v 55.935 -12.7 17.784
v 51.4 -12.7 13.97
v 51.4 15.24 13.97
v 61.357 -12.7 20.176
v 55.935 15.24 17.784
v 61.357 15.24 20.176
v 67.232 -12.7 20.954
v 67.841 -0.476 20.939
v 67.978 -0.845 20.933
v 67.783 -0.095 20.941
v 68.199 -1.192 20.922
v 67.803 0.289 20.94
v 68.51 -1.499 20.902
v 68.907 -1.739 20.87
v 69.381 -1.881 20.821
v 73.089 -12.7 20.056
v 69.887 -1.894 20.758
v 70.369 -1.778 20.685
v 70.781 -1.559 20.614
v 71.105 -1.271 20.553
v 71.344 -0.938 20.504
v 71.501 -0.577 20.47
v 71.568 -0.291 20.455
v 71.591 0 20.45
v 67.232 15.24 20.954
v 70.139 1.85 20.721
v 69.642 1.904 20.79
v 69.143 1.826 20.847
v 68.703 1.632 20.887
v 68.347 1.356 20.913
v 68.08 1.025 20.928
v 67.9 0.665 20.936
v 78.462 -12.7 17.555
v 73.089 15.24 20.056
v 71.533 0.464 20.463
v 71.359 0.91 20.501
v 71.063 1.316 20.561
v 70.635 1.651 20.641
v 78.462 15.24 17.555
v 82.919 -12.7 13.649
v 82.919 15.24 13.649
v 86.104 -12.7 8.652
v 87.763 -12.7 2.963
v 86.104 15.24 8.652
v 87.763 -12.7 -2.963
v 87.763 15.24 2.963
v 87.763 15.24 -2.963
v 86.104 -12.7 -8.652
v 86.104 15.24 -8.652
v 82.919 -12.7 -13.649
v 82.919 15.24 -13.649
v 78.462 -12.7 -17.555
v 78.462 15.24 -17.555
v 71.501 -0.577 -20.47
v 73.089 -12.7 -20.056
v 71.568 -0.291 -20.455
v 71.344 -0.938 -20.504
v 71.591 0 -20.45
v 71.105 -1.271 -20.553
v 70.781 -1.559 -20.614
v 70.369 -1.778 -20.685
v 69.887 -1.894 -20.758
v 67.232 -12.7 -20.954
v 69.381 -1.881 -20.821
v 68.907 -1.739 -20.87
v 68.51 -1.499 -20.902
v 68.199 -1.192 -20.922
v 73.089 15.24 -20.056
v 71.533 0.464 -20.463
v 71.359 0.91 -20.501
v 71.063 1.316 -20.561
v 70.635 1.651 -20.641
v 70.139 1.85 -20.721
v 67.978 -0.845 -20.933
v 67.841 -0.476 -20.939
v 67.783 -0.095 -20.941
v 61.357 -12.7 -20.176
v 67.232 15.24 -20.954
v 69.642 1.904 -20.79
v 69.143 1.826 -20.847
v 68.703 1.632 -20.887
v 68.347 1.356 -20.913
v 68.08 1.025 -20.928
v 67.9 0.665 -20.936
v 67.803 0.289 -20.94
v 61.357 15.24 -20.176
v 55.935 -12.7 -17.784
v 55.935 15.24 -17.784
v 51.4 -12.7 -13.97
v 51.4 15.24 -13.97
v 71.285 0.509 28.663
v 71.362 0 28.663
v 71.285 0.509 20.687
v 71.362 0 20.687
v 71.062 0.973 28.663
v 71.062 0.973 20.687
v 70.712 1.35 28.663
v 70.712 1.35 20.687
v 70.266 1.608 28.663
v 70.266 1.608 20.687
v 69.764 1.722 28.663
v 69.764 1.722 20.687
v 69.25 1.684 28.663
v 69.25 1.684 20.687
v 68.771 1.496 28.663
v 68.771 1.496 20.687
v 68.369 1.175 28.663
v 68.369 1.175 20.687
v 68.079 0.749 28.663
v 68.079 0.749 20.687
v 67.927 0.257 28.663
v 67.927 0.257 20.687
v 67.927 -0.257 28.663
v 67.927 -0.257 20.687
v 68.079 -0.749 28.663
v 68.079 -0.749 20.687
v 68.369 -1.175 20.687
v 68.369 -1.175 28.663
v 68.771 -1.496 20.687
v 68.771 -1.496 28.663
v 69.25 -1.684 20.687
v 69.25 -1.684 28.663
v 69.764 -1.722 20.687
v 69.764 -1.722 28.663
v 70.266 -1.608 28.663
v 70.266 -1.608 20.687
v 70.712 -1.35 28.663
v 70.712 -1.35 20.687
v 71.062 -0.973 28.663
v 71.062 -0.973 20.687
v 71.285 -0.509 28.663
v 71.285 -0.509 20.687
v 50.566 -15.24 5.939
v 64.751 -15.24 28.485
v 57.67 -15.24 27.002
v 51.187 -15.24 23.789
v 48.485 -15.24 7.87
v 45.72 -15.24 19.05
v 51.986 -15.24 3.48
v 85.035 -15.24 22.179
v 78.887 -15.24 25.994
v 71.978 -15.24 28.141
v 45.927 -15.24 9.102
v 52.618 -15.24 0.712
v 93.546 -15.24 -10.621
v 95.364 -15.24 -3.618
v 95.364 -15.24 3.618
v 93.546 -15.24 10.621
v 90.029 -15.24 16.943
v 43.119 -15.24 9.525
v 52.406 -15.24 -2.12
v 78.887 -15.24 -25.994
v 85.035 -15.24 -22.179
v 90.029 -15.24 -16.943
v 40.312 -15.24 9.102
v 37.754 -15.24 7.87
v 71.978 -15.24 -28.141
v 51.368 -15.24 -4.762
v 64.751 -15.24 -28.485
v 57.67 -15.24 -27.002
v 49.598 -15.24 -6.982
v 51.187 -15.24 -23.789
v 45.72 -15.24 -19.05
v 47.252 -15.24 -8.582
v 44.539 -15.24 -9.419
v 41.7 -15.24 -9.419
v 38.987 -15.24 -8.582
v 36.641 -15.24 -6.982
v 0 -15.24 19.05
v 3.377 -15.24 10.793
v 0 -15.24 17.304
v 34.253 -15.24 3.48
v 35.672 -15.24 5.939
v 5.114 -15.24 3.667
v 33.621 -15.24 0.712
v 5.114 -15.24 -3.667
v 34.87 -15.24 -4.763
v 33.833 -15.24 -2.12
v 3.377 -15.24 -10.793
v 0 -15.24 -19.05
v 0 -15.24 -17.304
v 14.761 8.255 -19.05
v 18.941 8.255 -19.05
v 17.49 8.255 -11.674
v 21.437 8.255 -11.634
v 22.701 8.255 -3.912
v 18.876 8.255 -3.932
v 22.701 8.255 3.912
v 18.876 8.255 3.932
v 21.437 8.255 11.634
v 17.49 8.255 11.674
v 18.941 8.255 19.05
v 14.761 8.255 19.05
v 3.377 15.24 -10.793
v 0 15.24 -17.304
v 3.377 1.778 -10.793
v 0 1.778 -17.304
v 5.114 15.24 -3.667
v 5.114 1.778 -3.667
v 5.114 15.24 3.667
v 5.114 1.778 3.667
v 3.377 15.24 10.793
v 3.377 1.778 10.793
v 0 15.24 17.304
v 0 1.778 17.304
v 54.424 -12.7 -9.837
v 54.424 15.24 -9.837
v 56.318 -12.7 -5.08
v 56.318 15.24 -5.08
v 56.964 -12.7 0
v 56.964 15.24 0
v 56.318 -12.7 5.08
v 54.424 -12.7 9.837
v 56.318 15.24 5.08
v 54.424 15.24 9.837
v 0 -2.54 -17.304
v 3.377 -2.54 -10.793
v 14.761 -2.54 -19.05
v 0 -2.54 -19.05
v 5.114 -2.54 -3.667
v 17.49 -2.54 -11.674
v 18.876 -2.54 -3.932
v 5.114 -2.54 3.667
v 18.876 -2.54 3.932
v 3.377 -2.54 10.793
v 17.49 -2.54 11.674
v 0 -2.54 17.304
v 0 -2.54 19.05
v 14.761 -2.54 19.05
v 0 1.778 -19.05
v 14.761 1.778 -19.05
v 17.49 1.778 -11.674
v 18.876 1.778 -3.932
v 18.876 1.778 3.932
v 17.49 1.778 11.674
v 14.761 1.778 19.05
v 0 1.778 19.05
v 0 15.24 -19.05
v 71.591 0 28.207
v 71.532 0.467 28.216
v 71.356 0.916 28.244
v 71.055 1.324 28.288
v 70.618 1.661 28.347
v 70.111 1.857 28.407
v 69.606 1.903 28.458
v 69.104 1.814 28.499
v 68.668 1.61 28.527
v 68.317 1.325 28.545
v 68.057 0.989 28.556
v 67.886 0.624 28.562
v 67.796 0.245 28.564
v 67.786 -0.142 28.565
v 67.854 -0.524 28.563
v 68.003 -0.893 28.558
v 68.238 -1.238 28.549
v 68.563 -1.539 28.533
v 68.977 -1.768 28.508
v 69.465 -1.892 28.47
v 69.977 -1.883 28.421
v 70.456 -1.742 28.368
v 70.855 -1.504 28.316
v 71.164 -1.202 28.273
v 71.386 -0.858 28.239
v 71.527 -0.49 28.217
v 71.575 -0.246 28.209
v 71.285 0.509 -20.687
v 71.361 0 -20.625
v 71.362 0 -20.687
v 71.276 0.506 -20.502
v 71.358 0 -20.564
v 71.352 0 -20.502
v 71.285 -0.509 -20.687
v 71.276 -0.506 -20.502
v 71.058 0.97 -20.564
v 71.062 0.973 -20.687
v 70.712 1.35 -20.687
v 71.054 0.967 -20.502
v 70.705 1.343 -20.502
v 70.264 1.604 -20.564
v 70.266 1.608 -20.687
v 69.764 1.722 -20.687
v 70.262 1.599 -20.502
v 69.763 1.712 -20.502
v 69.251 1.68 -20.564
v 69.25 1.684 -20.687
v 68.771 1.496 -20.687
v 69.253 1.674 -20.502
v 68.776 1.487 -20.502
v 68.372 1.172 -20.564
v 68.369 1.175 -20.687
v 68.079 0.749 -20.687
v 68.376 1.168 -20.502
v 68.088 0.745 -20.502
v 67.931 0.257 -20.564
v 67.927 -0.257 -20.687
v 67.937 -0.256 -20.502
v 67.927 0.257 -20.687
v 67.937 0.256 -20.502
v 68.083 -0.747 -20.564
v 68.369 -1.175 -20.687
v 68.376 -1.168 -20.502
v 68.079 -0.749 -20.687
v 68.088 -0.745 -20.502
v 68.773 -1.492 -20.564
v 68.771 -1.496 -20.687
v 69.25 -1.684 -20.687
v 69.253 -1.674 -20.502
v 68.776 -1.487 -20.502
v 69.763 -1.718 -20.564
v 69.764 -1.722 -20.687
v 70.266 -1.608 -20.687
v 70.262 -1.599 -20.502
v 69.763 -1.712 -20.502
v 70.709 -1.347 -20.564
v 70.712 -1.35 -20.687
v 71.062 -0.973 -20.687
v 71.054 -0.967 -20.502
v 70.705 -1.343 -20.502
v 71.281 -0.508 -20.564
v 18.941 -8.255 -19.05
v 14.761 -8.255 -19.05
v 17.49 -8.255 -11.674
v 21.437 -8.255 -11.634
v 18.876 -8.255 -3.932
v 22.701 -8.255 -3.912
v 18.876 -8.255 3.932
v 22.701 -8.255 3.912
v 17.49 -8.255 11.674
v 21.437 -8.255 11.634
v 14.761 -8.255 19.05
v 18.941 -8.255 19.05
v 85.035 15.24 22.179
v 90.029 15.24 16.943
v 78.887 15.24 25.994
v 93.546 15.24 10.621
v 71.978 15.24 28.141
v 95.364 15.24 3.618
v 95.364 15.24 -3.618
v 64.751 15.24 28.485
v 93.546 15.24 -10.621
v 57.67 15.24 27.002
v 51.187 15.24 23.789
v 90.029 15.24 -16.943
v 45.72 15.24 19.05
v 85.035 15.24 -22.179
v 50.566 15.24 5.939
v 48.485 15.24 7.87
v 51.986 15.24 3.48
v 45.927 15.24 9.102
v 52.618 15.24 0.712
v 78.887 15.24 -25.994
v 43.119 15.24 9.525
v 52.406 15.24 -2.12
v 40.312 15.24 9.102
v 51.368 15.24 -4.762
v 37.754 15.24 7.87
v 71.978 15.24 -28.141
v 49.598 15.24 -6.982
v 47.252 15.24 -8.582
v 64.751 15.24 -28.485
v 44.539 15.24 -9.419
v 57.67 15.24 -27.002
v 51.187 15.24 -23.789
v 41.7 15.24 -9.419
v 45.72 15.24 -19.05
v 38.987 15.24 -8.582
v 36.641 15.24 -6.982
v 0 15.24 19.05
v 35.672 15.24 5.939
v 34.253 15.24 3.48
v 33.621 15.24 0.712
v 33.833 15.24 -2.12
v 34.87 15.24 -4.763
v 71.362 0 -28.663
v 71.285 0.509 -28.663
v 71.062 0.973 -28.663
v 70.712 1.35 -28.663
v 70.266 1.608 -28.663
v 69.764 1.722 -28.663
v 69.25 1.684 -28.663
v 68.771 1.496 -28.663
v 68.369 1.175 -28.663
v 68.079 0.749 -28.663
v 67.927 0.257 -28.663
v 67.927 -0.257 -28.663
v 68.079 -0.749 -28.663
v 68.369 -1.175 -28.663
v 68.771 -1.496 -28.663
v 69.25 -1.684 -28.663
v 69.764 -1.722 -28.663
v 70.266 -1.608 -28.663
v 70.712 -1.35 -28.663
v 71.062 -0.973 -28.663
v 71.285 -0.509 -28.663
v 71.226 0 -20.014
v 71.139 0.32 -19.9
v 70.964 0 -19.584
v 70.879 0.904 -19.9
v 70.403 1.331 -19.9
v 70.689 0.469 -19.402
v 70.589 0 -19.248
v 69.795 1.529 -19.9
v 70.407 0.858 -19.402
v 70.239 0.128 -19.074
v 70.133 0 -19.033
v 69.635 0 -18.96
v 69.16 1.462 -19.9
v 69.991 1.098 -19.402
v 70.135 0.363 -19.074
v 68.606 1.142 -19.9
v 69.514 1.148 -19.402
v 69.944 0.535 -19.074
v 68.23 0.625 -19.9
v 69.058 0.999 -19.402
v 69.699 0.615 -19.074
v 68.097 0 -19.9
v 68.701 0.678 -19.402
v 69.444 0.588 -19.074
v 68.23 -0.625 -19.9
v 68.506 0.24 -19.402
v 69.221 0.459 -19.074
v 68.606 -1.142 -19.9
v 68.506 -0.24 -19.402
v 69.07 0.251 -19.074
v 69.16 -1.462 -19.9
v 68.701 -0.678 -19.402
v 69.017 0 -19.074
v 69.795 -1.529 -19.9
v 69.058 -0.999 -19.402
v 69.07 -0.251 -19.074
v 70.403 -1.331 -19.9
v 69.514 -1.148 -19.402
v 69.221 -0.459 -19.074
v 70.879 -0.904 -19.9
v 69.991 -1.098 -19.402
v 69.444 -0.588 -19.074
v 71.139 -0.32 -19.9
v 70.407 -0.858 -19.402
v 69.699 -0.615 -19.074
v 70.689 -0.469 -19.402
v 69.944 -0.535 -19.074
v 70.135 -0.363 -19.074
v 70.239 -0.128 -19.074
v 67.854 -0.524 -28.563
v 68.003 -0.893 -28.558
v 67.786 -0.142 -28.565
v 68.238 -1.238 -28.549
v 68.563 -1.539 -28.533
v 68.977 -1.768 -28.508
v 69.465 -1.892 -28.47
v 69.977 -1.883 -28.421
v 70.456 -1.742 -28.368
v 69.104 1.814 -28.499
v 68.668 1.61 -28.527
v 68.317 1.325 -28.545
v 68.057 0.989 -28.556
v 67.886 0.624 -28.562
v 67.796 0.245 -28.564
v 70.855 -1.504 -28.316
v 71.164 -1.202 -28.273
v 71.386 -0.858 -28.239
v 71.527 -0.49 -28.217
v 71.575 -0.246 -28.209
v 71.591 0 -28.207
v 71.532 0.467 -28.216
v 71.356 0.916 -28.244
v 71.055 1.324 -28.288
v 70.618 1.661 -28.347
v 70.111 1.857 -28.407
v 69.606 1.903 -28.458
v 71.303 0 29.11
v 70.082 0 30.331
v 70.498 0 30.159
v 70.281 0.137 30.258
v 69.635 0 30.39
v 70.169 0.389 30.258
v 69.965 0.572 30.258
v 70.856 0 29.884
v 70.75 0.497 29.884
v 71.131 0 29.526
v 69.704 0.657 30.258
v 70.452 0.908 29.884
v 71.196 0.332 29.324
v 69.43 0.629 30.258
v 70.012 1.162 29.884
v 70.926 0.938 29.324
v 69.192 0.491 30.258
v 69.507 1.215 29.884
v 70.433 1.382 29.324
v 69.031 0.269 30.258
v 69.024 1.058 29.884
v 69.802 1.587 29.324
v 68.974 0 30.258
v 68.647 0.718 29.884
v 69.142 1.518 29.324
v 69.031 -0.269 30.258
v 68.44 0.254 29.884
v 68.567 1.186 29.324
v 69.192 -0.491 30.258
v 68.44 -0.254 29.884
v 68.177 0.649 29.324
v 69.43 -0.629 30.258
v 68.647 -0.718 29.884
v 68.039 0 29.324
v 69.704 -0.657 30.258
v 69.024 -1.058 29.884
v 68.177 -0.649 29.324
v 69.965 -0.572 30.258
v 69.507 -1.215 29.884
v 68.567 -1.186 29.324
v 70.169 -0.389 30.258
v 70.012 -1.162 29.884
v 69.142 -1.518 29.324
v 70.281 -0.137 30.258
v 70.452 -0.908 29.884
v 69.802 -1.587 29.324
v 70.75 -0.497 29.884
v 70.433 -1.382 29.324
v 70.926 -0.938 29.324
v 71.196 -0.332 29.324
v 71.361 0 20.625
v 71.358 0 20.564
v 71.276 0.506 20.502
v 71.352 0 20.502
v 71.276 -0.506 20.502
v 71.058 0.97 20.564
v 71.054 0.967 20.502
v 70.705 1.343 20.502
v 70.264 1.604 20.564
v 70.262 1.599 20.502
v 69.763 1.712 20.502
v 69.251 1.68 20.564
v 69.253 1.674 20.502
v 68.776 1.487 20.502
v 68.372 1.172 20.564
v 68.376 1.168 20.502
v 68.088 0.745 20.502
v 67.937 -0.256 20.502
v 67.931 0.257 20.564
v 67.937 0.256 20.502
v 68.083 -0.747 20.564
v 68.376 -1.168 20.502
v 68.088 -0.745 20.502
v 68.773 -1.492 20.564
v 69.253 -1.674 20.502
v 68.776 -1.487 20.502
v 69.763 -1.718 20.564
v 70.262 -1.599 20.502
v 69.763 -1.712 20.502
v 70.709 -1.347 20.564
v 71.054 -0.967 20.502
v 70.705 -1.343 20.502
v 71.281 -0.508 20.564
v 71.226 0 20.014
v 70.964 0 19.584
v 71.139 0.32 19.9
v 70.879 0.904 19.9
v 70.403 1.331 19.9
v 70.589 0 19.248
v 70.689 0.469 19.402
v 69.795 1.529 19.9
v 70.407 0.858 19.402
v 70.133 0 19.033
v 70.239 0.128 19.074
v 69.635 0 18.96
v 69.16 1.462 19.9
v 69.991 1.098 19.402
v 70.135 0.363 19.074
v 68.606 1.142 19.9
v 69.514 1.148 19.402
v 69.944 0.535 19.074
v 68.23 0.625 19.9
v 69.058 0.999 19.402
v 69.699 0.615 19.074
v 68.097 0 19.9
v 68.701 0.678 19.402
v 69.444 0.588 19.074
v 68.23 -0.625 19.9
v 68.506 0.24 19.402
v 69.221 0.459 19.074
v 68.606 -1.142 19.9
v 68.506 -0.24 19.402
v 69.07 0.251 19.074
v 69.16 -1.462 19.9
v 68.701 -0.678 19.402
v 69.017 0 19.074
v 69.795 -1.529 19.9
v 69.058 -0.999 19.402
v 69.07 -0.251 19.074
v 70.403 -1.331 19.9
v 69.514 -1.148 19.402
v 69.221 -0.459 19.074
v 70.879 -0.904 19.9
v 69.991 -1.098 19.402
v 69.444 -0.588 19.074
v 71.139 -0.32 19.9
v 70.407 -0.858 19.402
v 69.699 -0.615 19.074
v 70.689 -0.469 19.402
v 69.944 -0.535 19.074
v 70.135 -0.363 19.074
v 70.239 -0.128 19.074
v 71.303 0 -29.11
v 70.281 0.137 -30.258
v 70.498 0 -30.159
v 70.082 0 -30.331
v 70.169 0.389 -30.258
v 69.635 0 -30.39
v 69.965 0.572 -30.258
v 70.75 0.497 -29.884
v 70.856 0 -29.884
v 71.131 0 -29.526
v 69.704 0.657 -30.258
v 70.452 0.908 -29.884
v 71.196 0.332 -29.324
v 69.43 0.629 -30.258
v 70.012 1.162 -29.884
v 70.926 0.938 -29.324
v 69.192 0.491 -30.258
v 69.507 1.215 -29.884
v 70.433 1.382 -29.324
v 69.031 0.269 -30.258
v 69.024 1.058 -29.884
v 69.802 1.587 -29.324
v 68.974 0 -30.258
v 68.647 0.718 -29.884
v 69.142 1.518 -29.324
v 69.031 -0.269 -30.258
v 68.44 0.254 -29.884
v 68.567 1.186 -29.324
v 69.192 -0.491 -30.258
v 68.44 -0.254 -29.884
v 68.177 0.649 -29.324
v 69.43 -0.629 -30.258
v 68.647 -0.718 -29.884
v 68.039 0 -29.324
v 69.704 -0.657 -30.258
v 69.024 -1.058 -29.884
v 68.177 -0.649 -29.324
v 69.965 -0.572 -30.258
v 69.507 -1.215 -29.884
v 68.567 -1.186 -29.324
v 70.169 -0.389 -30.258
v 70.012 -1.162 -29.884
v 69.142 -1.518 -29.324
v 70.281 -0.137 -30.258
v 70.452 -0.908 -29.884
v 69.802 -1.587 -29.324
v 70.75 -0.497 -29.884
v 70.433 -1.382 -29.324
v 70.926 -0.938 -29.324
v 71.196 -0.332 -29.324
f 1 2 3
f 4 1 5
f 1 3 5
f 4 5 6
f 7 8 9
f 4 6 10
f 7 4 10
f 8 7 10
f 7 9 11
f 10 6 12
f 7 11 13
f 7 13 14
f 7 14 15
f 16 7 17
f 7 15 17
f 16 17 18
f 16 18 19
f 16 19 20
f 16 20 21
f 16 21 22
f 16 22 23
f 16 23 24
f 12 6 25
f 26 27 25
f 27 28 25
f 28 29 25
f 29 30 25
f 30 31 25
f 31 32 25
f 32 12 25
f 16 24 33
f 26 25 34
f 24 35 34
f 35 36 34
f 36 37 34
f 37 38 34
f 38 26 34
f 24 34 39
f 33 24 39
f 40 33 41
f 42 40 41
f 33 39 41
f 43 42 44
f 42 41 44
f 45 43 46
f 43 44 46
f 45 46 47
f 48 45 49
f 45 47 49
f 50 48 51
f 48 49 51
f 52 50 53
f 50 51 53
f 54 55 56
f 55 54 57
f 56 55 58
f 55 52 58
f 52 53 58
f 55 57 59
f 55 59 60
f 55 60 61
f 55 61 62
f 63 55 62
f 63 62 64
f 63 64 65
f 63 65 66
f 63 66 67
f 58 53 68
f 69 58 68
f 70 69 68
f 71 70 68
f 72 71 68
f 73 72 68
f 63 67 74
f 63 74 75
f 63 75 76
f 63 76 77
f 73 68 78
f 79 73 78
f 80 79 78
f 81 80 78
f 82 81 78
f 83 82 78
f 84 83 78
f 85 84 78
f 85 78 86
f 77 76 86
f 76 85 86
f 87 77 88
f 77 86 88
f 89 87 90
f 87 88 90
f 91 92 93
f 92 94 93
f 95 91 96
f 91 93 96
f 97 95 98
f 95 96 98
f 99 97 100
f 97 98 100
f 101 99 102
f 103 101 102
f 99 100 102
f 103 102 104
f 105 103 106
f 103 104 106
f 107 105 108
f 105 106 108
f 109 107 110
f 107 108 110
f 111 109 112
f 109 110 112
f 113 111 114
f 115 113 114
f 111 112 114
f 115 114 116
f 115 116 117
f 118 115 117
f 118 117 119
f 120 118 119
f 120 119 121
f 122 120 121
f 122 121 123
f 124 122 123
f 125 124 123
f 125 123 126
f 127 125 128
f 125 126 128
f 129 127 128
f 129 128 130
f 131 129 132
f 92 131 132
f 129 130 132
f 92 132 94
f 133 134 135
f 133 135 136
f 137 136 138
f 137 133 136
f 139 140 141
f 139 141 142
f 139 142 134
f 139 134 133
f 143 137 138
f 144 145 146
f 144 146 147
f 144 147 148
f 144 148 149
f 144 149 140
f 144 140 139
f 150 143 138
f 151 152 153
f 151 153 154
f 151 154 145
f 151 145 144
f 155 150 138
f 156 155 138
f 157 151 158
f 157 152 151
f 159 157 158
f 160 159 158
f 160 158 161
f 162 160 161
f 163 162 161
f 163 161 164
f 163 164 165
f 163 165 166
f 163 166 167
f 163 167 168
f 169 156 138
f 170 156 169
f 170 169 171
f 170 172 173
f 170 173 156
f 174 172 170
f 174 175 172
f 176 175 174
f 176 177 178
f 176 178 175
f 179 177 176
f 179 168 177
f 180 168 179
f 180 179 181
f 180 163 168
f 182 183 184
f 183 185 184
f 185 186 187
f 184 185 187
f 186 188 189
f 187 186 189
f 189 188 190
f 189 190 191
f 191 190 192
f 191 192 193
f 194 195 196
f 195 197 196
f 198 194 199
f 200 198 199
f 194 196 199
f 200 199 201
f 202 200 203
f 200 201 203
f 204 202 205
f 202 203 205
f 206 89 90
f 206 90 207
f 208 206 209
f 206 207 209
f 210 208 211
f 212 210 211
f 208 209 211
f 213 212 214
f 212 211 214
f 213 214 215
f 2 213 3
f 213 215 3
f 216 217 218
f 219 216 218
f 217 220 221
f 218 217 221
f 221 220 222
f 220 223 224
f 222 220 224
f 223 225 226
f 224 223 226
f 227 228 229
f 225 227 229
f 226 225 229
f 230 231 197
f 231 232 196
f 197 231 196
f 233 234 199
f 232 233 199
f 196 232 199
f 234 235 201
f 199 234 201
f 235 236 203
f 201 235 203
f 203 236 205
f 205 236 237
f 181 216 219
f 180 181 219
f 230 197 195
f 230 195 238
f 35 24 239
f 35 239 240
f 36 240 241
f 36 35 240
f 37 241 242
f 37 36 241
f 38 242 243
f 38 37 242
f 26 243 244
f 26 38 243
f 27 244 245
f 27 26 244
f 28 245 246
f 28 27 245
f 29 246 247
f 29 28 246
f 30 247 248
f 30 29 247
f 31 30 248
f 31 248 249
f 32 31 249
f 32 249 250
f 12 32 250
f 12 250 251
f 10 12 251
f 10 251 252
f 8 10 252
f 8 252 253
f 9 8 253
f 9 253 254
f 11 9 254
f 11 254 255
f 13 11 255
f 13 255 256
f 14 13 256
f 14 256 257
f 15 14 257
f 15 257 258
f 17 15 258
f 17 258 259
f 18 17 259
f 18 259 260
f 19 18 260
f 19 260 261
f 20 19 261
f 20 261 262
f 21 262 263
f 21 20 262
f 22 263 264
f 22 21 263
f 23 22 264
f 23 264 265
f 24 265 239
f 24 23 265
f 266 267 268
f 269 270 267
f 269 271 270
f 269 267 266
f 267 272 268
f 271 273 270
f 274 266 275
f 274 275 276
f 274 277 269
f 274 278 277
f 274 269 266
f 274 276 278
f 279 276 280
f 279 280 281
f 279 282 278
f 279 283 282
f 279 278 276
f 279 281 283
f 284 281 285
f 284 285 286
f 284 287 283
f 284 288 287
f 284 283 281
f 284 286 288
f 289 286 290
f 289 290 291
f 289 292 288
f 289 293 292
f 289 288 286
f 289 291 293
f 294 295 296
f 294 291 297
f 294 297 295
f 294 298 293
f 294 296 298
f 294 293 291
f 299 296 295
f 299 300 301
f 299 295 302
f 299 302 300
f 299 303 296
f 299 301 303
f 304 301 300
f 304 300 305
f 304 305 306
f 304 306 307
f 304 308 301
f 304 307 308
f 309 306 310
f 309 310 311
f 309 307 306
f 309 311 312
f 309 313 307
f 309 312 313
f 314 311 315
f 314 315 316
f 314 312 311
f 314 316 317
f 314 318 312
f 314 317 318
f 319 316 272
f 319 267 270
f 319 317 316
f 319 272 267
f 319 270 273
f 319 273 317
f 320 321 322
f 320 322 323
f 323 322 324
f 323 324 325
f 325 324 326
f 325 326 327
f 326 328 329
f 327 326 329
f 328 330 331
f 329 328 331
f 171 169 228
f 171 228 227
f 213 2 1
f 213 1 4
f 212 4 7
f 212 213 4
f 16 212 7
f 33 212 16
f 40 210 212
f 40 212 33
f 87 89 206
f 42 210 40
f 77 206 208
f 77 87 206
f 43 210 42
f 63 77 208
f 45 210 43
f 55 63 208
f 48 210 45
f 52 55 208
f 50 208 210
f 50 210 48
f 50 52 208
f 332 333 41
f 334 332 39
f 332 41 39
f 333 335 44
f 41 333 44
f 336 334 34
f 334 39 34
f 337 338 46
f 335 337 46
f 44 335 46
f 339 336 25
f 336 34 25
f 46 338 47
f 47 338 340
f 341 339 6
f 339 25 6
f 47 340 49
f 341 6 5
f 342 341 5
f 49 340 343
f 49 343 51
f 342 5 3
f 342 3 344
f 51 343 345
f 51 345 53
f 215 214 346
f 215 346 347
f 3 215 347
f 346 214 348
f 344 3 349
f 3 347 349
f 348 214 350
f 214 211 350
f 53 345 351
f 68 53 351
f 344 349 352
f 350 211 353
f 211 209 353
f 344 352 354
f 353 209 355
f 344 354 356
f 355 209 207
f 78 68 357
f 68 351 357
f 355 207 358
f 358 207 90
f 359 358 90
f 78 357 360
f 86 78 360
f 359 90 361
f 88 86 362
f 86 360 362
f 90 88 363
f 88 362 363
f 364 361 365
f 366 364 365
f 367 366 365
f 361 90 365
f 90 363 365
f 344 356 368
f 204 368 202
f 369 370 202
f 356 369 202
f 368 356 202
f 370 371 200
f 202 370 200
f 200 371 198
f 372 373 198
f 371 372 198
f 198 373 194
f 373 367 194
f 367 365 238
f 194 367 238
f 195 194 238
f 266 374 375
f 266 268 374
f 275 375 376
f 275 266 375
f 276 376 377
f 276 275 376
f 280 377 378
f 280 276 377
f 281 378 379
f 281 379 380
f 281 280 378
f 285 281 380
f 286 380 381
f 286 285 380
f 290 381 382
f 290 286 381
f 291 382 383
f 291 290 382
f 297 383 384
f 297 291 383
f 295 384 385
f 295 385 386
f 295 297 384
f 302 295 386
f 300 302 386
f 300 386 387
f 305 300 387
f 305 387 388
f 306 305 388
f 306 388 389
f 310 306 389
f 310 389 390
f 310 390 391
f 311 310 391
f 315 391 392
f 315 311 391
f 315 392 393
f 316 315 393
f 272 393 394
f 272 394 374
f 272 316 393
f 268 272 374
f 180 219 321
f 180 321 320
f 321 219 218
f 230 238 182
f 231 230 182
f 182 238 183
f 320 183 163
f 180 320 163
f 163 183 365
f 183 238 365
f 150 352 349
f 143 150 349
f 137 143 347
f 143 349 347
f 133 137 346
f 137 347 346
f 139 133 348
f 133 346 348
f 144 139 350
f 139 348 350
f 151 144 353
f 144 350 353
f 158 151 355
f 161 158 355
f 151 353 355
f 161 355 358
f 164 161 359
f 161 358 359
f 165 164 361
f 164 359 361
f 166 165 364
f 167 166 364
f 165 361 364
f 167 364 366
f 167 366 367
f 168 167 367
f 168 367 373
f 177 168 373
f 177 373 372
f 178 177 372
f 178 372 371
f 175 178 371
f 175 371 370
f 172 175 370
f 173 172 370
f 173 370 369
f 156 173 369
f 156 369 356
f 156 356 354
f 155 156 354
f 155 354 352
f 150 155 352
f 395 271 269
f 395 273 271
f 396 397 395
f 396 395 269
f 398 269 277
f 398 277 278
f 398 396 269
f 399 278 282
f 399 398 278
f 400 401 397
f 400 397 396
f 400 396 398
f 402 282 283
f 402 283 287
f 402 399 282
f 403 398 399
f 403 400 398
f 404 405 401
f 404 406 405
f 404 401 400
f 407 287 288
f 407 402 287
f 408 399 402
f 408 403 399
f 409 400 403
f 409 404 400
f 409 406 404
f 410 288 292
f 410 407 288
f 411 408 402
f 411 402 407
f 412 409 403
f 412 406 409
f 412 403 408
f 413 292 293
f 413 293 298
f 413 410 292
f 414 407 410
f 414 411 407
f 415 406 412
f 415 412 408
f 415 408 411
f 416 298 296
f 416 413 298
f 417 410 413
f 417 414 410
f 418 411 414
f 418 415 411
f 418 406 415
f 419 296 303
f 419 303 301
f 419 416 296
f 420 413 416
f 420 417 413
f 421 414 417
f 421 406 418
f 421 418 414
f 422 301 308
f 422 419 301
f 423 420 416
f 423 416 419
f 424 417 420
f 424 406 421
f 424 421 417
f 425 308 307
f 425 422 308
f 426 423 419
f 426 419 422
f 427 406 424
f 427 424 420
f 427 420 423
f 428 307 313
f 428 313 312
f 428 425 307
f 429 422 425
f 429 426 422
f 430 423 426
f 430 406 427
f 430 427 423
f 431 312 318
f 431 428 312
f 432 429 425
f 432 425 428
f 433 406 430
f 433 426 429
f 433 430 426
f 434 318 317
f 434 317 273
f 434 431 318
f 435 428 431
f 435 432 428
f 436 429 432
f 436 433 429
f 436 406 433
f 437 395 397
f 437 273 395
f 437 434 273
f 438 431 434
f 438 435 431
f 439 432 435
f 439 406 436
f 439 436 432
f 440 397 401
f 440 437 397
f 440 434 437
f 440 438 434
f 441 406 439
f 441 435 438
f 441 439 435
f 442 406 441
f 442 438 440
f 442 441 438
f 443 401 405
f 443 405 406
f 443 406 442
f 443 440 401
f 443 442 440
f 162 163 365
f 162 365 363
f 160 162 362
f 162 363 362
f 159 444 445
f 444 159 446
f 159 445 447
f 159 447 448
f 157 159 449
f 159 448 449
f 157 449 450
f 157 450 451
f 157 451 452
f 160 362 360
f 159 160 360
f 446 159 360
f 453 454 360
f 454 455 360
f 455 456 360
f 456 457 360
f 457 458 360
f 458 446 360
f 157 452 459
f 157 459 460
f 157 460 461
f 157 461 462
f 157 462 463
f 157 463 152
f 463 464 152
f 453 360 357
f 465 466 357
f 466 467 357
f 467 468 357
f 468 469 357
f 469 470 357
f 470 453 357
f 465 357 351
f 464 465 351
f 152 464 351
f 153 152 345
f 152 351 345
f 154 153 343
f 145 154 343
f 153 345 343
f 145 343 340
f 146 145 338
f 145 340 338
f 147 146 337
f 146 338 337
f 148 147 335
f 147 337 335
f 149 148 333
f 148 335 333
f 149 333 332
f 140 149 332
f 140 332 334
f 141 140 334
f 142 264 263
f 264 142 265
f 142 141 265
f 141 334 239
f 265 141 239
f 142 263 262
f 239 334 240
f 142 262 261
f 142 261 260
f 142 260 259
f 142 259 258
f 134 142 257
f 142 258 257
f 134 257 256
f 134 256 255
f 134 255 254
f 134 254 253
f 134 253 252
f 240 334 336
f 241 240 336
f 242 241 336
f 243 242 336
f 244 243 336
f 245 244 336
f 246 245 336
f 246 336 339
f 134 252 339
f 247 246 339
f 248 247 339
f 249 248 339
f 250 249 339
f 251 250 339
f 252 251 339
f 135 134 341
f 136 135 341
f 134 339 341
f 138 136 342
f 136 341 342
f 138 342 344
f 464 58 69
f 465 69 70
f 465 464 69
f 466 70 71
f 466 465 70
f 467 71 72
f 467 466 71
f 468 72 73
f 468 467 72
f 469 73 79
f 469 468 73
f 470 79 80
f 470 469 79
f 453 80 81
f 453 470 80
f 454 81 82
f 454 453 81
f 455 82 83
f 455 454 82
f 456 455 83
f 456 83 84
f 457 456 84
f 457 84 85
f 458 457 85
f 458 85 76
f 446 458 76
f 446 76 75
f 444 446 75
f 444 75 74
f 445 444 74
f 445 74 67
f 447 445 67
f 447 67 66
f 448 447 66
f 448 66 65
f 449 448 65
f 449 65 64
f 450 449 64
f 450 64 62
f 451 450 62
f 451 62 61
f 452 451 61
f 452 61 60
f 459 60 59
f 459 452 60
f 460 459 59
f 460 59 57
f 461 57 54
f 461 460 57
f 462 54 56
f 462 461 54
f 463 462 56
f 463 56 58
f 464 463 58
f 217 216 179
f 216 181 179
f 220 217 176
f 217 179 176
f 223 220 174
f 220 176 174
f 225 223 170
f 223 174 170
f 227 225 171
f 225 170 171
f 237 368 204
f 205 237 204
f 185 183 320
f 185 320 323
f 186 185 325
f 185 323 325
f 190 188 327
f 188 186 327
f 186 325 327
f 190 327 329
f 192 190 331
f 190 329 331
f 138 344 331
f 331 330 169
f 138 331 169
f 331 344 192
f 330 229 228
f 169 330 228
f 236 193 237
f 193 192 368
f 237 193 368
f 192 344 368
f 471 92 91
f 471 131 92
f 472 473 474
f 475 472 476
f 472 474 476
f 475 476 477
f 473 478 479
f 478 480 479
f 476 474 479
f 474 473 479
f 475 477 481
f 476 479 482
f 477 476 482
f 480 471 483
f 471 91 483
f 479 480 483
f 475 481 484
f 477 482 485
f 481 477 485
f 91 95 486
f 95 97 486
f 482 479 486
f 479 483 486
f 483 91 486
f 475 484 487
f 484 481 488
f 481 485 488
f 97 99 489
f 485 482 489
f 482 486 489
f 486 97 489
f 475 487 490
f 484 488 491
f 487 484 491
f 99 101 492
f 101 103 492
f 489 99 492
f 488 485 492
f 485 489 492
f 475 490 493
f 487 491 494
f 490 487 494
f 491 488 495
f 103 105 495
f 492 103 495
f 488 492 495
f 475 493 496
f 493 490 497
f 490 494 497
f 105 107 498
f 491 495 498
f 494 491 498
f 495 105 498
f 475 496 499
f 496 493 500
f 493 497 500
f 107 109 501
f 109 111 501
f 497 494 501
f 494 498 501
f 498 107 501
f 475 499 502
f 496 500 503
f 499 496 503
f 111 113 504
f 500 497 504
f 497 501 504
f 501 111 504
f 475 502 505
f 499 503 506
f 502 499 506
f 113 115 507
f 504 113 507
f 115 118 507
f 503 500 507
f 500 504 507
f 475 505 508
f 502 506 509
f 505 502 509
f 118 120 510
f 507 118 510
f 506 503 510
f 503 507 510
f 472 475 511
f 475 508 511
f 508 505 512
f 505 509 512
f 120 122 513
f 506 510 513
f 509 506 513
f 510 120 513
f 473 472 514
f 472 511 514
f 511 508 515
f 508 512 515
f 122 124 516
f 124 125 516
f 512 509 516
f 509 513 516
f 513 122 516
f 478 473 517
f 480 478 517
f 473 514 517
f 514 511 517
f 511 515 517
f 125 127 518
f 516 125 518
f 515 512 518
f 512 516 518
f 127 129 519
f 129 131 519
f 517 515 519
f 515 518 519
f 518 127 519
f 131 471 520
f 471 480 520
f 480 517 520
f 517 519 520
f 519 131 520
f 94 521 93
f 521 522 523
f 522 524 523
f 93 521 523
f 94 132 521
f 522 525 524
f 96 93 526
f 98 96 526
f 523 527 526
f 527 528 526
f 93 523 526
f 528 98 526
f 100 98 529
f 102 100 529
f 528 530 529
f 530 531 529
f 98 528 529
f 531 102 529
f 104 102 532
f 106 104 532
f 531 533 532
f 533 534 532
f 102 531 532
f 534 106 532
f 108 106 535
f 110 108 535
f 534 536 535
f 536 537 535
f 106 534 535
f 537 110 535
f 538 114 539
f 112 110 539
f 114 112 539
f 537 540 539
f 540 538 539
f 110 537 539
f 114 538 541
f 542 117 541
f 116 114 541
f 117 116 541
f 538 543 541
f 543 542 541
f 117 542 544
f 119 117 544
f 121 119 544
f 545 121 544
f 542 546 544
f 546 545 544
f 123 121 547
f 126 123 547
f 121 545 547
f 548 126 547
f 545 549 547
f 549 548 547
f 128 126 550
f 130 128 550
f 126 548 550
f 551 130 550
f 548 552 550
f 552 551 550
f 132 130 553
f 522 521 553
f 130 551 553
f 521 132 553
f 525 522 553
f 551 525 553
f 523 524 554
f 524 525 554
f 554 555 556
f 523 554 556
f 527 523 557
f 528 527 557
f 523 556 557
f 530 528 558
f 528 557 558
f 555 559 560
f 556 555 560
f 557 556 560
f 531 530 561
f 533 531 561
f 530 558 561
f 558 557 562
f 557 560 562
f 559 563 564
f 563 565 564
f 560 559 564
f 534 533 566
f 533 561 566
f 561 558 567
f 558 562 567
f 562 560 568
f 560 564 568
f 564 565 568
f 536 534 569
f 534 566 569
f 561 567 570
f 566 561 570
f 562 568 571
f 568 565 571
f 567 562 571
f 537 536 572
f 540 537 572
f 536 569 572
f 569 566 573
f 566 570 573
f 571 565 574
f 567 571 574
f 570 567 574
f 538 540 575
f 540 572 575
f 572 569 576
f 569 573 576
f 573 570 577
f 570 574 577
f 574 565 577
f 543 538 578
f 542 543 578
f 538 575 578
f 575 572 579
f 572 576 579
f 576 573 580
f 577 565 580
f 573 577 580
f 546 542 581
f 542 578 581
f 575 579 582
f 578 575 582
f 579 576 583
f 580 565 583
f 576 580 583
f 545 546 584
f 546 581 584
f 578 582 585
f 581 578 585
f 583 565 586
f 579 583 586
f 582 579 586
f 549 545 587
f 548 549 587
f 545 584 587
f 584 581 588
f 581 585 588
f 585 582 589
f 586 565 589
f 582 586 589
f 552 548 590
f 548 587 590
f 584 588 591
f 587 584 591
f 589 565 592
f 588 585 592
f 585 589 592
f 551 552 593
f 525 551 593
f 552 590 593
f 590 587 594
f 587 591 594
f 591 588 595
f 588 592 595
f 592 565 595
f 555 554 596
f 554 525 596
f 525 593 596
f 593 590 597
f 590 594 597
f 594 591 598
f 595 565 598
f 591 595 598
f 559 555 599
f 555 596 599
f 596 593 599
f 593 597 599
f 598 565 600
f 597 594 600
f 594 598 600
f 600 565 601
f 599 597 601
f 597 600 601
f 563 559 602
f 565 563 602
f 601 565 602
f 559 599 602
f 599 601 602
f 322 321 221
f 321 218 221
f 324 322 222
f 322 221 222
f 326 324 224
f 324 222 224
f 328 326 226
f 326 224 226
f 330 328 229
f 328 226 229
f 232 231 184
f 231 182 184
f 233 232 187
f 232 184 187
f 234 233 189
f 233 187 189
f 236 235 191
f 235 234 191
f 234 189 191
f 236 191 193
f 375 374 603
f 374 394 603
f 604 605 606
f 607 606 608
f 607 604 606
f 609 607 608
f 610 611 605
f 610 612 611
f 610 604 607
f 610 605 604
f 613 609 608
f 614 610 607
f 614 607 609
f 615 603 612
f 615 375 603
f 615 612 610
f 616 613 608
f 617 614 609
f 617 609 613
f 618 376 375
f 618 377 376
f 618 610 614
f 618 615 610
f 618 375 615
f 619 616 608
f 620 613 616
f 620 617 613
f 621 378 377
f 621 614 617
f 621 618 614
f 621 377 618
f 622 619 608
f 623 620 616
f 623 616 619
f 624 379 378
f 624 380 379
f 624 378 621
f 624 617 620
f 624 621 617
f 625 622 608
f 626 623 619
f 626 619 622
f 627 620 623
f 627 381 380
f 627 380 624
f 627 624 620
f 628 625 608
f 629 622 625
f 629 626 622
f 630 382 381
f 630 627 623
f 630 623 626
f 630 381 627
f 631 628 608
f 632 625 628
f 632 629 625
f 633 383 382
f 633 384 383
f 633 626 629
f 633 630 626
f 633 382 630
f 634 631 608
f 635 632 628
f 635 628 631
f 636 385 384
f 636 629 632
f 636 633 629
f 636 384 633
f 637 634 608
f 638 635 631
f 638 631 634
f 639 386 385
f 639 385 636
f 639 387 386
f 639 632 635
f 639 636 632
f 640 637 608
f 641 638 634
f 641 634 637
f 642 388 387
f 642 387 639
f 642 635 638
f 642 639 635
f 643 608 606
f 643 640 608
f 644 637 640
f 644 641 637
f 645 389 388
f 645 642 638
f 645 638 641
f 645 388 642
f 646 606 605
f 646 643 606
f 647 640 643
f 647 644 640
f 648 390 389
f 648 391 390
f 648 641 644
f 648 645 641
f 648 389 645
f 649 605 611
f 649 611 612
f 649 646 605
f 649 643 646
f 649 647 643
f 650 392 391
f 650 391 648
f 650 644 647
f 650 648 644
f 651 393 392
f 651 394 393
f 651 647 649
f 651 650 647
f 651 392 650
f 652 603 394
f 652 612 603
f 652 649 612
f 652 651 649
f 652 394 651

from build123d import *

# Parameters (mm, degrees)
BOSS_EXTRUDE1_DEPTH     = 15.24
CUT_EXTRUDE1_DEPTH      = 27.94
CUT_EXTRUDE2_DEPTH      = 101.930245942
CUT_EXTRUDE2_DEPTH_BACK = 101.930245942
SKETCH4_R               = 1.905
SKETCH6_R               = 9.525
CUT_EXTRUDE3_DEPTH      = 105.836564482


with BuildPart() as part:
    # Sketch1 → Boss-Extrude1 (new, symmetric)
    with BuildSketch(Plane(origin=(0, 0, 0), x_dir=(1, 0, 0), z_dir=(0, 1, 0))):
        with BuildLine():
            Line((0, 19.05), (45.72, 19.05))
            ThreePointArc((45.72, 19.05), (95.593547486, 0), (45.72, -19.05))
            Line((45.72, -19.05), (0, -19.05))
            Line((0, -19.05), (0, 19.05))
        make_face()
    extrude(amount=BOSS_EXTRUDE1_DEPTH, both=True)

    # Sketch3 → Cut-Extrude1 (cut)
    with BuildSketch(Plane(origin=(0, 15.24, 0), x_dir=(1, 0, 0), z_dir=(0, 1, 0))):
        with BuildLine():
            ThreePointArc((51.399612663, 13.97), (56.963546114, 0), (51.399612663, -13.97))
            ThreePointArc((51.399612663, -13.97), (87.973547486, 0), (51.399612663, 13.97))
        make_face()
    extrude(amount=-CUT_EXTRUDE1_DEPTH, mode=Mode.SUBTRACT)

    # Sketch4 → Cut-Extrude2 (cut, two sides: drawn at the far end of the back side and taken through both)
    with BuildSketch(Plane.XY.offset(-CUT_EXTRUDE2_DEPTH_BACK)):
        with Locations((69.685547486, 0)):
            Circle(SKETCH4_R)
    extrude(amount=CUT_EXTRUDE2_DEPTH + CUT_EXTRUDE2_DEPTH_BACK, mode=Mode.SUBTRACT)

    # Sketch2 → Cut-Revolve1 (revolve, cut)
    with BuildSketch(Plane.XY):
        Polygon((-3.048, 17.145), (5.334, 17.145), (5.334, 1.778), (19.05, 1.778), (19.05, 8.255), (22.86, 8.255), (22.86, -8.255), (19.05, -8.255), (19.05, -2.54), (5.334, -2.54), (5.334, -17.145), (-3.048, -17.145), align=None)
    revolve(axis=Axis((-25.4, 18.8595, 0), (0, -1, 0)), mode=Mode.SUBTRACT)

    # Sketch6 → Cut-Extrude3 (cut, through all)
    with BuildSketch(Plane(origin=(0, 15.24, 0), x_dir=(1, 0, 0), z_dir=(0, 1, 0))):
        with Locations(Location((43.11933437, 0, 0), (0, 0, 270))):
            Circle(SKETCH6_R)
    extrude(amount=-CUT_EXTRUDE3_DEPTH, mode=Mode.SUBTRACT)


with BuildPart() as body_2:
    # Sketch5 → Revolve1 (revolve)
    with BuildSketch(Plane(origin=(0, 0, 0), x_dir=(1, 0, 0), z_dir=(0, 1, 0))):
        with BuildLine():
            ThreePointArc((71.361947486, -28.242972603), (70.499961748, -28.362129323), (69.634747486, -28.454984143))
            Line((69.634747486, -28.454984143), (69.634747486, -30.389940871))
            ThreePointArc((69.634747486, -30.389940871), (70.856062318, -29.884055704), (71.361947486, -28.662740871))
            Line((71.361947486, -28.662740871), (71.361947486, -28.242972603))
        make_face()
        with BuildLine():
            ThreePointArc((71.351999268, -20.502029671), (70.496376886, -20.66438307), (69.634747486, -20.791044287))
            Line((69.634747486, -20.791044287), (69.634747486, -28.454984143))
            ThreePointArc((69.634747486, -28.454984143), (70.499961748, -28.362129323), (71.361947486, -28.242972603))
            Line((71.361947486, -28.242972603), (71.361947486, -20.687140871))
            ThreePointArc((71.361947486, -20.687140871), (71.359458638, -20.594451709), (71.351999268, -20.502029671))
        make_face()
        with BuildLine():
            ThreePointArc((71.351999268, -20.502029671), (70.788761302, -19.402044785), (69.634747486, -18.959940871))
            Line((69.634747486, -18.959940871), (69.634747486, -20.791044287))
            ThreePointArc((69.634747486, -20.791044287), (70.496376886, -20.66438307), (71.351999268, -20.502029671))
        make_face()
    revolve(axis=Axis((69.634747486, 0, 18.959940871), (0, 0, 1)))


with BuildPart() as body_3:
    # Mirror1: mirrored copy
    add(body_2.part.mirror(Plane.XY))


solid = Compound([part.part, body_2.part, body_3.part])
